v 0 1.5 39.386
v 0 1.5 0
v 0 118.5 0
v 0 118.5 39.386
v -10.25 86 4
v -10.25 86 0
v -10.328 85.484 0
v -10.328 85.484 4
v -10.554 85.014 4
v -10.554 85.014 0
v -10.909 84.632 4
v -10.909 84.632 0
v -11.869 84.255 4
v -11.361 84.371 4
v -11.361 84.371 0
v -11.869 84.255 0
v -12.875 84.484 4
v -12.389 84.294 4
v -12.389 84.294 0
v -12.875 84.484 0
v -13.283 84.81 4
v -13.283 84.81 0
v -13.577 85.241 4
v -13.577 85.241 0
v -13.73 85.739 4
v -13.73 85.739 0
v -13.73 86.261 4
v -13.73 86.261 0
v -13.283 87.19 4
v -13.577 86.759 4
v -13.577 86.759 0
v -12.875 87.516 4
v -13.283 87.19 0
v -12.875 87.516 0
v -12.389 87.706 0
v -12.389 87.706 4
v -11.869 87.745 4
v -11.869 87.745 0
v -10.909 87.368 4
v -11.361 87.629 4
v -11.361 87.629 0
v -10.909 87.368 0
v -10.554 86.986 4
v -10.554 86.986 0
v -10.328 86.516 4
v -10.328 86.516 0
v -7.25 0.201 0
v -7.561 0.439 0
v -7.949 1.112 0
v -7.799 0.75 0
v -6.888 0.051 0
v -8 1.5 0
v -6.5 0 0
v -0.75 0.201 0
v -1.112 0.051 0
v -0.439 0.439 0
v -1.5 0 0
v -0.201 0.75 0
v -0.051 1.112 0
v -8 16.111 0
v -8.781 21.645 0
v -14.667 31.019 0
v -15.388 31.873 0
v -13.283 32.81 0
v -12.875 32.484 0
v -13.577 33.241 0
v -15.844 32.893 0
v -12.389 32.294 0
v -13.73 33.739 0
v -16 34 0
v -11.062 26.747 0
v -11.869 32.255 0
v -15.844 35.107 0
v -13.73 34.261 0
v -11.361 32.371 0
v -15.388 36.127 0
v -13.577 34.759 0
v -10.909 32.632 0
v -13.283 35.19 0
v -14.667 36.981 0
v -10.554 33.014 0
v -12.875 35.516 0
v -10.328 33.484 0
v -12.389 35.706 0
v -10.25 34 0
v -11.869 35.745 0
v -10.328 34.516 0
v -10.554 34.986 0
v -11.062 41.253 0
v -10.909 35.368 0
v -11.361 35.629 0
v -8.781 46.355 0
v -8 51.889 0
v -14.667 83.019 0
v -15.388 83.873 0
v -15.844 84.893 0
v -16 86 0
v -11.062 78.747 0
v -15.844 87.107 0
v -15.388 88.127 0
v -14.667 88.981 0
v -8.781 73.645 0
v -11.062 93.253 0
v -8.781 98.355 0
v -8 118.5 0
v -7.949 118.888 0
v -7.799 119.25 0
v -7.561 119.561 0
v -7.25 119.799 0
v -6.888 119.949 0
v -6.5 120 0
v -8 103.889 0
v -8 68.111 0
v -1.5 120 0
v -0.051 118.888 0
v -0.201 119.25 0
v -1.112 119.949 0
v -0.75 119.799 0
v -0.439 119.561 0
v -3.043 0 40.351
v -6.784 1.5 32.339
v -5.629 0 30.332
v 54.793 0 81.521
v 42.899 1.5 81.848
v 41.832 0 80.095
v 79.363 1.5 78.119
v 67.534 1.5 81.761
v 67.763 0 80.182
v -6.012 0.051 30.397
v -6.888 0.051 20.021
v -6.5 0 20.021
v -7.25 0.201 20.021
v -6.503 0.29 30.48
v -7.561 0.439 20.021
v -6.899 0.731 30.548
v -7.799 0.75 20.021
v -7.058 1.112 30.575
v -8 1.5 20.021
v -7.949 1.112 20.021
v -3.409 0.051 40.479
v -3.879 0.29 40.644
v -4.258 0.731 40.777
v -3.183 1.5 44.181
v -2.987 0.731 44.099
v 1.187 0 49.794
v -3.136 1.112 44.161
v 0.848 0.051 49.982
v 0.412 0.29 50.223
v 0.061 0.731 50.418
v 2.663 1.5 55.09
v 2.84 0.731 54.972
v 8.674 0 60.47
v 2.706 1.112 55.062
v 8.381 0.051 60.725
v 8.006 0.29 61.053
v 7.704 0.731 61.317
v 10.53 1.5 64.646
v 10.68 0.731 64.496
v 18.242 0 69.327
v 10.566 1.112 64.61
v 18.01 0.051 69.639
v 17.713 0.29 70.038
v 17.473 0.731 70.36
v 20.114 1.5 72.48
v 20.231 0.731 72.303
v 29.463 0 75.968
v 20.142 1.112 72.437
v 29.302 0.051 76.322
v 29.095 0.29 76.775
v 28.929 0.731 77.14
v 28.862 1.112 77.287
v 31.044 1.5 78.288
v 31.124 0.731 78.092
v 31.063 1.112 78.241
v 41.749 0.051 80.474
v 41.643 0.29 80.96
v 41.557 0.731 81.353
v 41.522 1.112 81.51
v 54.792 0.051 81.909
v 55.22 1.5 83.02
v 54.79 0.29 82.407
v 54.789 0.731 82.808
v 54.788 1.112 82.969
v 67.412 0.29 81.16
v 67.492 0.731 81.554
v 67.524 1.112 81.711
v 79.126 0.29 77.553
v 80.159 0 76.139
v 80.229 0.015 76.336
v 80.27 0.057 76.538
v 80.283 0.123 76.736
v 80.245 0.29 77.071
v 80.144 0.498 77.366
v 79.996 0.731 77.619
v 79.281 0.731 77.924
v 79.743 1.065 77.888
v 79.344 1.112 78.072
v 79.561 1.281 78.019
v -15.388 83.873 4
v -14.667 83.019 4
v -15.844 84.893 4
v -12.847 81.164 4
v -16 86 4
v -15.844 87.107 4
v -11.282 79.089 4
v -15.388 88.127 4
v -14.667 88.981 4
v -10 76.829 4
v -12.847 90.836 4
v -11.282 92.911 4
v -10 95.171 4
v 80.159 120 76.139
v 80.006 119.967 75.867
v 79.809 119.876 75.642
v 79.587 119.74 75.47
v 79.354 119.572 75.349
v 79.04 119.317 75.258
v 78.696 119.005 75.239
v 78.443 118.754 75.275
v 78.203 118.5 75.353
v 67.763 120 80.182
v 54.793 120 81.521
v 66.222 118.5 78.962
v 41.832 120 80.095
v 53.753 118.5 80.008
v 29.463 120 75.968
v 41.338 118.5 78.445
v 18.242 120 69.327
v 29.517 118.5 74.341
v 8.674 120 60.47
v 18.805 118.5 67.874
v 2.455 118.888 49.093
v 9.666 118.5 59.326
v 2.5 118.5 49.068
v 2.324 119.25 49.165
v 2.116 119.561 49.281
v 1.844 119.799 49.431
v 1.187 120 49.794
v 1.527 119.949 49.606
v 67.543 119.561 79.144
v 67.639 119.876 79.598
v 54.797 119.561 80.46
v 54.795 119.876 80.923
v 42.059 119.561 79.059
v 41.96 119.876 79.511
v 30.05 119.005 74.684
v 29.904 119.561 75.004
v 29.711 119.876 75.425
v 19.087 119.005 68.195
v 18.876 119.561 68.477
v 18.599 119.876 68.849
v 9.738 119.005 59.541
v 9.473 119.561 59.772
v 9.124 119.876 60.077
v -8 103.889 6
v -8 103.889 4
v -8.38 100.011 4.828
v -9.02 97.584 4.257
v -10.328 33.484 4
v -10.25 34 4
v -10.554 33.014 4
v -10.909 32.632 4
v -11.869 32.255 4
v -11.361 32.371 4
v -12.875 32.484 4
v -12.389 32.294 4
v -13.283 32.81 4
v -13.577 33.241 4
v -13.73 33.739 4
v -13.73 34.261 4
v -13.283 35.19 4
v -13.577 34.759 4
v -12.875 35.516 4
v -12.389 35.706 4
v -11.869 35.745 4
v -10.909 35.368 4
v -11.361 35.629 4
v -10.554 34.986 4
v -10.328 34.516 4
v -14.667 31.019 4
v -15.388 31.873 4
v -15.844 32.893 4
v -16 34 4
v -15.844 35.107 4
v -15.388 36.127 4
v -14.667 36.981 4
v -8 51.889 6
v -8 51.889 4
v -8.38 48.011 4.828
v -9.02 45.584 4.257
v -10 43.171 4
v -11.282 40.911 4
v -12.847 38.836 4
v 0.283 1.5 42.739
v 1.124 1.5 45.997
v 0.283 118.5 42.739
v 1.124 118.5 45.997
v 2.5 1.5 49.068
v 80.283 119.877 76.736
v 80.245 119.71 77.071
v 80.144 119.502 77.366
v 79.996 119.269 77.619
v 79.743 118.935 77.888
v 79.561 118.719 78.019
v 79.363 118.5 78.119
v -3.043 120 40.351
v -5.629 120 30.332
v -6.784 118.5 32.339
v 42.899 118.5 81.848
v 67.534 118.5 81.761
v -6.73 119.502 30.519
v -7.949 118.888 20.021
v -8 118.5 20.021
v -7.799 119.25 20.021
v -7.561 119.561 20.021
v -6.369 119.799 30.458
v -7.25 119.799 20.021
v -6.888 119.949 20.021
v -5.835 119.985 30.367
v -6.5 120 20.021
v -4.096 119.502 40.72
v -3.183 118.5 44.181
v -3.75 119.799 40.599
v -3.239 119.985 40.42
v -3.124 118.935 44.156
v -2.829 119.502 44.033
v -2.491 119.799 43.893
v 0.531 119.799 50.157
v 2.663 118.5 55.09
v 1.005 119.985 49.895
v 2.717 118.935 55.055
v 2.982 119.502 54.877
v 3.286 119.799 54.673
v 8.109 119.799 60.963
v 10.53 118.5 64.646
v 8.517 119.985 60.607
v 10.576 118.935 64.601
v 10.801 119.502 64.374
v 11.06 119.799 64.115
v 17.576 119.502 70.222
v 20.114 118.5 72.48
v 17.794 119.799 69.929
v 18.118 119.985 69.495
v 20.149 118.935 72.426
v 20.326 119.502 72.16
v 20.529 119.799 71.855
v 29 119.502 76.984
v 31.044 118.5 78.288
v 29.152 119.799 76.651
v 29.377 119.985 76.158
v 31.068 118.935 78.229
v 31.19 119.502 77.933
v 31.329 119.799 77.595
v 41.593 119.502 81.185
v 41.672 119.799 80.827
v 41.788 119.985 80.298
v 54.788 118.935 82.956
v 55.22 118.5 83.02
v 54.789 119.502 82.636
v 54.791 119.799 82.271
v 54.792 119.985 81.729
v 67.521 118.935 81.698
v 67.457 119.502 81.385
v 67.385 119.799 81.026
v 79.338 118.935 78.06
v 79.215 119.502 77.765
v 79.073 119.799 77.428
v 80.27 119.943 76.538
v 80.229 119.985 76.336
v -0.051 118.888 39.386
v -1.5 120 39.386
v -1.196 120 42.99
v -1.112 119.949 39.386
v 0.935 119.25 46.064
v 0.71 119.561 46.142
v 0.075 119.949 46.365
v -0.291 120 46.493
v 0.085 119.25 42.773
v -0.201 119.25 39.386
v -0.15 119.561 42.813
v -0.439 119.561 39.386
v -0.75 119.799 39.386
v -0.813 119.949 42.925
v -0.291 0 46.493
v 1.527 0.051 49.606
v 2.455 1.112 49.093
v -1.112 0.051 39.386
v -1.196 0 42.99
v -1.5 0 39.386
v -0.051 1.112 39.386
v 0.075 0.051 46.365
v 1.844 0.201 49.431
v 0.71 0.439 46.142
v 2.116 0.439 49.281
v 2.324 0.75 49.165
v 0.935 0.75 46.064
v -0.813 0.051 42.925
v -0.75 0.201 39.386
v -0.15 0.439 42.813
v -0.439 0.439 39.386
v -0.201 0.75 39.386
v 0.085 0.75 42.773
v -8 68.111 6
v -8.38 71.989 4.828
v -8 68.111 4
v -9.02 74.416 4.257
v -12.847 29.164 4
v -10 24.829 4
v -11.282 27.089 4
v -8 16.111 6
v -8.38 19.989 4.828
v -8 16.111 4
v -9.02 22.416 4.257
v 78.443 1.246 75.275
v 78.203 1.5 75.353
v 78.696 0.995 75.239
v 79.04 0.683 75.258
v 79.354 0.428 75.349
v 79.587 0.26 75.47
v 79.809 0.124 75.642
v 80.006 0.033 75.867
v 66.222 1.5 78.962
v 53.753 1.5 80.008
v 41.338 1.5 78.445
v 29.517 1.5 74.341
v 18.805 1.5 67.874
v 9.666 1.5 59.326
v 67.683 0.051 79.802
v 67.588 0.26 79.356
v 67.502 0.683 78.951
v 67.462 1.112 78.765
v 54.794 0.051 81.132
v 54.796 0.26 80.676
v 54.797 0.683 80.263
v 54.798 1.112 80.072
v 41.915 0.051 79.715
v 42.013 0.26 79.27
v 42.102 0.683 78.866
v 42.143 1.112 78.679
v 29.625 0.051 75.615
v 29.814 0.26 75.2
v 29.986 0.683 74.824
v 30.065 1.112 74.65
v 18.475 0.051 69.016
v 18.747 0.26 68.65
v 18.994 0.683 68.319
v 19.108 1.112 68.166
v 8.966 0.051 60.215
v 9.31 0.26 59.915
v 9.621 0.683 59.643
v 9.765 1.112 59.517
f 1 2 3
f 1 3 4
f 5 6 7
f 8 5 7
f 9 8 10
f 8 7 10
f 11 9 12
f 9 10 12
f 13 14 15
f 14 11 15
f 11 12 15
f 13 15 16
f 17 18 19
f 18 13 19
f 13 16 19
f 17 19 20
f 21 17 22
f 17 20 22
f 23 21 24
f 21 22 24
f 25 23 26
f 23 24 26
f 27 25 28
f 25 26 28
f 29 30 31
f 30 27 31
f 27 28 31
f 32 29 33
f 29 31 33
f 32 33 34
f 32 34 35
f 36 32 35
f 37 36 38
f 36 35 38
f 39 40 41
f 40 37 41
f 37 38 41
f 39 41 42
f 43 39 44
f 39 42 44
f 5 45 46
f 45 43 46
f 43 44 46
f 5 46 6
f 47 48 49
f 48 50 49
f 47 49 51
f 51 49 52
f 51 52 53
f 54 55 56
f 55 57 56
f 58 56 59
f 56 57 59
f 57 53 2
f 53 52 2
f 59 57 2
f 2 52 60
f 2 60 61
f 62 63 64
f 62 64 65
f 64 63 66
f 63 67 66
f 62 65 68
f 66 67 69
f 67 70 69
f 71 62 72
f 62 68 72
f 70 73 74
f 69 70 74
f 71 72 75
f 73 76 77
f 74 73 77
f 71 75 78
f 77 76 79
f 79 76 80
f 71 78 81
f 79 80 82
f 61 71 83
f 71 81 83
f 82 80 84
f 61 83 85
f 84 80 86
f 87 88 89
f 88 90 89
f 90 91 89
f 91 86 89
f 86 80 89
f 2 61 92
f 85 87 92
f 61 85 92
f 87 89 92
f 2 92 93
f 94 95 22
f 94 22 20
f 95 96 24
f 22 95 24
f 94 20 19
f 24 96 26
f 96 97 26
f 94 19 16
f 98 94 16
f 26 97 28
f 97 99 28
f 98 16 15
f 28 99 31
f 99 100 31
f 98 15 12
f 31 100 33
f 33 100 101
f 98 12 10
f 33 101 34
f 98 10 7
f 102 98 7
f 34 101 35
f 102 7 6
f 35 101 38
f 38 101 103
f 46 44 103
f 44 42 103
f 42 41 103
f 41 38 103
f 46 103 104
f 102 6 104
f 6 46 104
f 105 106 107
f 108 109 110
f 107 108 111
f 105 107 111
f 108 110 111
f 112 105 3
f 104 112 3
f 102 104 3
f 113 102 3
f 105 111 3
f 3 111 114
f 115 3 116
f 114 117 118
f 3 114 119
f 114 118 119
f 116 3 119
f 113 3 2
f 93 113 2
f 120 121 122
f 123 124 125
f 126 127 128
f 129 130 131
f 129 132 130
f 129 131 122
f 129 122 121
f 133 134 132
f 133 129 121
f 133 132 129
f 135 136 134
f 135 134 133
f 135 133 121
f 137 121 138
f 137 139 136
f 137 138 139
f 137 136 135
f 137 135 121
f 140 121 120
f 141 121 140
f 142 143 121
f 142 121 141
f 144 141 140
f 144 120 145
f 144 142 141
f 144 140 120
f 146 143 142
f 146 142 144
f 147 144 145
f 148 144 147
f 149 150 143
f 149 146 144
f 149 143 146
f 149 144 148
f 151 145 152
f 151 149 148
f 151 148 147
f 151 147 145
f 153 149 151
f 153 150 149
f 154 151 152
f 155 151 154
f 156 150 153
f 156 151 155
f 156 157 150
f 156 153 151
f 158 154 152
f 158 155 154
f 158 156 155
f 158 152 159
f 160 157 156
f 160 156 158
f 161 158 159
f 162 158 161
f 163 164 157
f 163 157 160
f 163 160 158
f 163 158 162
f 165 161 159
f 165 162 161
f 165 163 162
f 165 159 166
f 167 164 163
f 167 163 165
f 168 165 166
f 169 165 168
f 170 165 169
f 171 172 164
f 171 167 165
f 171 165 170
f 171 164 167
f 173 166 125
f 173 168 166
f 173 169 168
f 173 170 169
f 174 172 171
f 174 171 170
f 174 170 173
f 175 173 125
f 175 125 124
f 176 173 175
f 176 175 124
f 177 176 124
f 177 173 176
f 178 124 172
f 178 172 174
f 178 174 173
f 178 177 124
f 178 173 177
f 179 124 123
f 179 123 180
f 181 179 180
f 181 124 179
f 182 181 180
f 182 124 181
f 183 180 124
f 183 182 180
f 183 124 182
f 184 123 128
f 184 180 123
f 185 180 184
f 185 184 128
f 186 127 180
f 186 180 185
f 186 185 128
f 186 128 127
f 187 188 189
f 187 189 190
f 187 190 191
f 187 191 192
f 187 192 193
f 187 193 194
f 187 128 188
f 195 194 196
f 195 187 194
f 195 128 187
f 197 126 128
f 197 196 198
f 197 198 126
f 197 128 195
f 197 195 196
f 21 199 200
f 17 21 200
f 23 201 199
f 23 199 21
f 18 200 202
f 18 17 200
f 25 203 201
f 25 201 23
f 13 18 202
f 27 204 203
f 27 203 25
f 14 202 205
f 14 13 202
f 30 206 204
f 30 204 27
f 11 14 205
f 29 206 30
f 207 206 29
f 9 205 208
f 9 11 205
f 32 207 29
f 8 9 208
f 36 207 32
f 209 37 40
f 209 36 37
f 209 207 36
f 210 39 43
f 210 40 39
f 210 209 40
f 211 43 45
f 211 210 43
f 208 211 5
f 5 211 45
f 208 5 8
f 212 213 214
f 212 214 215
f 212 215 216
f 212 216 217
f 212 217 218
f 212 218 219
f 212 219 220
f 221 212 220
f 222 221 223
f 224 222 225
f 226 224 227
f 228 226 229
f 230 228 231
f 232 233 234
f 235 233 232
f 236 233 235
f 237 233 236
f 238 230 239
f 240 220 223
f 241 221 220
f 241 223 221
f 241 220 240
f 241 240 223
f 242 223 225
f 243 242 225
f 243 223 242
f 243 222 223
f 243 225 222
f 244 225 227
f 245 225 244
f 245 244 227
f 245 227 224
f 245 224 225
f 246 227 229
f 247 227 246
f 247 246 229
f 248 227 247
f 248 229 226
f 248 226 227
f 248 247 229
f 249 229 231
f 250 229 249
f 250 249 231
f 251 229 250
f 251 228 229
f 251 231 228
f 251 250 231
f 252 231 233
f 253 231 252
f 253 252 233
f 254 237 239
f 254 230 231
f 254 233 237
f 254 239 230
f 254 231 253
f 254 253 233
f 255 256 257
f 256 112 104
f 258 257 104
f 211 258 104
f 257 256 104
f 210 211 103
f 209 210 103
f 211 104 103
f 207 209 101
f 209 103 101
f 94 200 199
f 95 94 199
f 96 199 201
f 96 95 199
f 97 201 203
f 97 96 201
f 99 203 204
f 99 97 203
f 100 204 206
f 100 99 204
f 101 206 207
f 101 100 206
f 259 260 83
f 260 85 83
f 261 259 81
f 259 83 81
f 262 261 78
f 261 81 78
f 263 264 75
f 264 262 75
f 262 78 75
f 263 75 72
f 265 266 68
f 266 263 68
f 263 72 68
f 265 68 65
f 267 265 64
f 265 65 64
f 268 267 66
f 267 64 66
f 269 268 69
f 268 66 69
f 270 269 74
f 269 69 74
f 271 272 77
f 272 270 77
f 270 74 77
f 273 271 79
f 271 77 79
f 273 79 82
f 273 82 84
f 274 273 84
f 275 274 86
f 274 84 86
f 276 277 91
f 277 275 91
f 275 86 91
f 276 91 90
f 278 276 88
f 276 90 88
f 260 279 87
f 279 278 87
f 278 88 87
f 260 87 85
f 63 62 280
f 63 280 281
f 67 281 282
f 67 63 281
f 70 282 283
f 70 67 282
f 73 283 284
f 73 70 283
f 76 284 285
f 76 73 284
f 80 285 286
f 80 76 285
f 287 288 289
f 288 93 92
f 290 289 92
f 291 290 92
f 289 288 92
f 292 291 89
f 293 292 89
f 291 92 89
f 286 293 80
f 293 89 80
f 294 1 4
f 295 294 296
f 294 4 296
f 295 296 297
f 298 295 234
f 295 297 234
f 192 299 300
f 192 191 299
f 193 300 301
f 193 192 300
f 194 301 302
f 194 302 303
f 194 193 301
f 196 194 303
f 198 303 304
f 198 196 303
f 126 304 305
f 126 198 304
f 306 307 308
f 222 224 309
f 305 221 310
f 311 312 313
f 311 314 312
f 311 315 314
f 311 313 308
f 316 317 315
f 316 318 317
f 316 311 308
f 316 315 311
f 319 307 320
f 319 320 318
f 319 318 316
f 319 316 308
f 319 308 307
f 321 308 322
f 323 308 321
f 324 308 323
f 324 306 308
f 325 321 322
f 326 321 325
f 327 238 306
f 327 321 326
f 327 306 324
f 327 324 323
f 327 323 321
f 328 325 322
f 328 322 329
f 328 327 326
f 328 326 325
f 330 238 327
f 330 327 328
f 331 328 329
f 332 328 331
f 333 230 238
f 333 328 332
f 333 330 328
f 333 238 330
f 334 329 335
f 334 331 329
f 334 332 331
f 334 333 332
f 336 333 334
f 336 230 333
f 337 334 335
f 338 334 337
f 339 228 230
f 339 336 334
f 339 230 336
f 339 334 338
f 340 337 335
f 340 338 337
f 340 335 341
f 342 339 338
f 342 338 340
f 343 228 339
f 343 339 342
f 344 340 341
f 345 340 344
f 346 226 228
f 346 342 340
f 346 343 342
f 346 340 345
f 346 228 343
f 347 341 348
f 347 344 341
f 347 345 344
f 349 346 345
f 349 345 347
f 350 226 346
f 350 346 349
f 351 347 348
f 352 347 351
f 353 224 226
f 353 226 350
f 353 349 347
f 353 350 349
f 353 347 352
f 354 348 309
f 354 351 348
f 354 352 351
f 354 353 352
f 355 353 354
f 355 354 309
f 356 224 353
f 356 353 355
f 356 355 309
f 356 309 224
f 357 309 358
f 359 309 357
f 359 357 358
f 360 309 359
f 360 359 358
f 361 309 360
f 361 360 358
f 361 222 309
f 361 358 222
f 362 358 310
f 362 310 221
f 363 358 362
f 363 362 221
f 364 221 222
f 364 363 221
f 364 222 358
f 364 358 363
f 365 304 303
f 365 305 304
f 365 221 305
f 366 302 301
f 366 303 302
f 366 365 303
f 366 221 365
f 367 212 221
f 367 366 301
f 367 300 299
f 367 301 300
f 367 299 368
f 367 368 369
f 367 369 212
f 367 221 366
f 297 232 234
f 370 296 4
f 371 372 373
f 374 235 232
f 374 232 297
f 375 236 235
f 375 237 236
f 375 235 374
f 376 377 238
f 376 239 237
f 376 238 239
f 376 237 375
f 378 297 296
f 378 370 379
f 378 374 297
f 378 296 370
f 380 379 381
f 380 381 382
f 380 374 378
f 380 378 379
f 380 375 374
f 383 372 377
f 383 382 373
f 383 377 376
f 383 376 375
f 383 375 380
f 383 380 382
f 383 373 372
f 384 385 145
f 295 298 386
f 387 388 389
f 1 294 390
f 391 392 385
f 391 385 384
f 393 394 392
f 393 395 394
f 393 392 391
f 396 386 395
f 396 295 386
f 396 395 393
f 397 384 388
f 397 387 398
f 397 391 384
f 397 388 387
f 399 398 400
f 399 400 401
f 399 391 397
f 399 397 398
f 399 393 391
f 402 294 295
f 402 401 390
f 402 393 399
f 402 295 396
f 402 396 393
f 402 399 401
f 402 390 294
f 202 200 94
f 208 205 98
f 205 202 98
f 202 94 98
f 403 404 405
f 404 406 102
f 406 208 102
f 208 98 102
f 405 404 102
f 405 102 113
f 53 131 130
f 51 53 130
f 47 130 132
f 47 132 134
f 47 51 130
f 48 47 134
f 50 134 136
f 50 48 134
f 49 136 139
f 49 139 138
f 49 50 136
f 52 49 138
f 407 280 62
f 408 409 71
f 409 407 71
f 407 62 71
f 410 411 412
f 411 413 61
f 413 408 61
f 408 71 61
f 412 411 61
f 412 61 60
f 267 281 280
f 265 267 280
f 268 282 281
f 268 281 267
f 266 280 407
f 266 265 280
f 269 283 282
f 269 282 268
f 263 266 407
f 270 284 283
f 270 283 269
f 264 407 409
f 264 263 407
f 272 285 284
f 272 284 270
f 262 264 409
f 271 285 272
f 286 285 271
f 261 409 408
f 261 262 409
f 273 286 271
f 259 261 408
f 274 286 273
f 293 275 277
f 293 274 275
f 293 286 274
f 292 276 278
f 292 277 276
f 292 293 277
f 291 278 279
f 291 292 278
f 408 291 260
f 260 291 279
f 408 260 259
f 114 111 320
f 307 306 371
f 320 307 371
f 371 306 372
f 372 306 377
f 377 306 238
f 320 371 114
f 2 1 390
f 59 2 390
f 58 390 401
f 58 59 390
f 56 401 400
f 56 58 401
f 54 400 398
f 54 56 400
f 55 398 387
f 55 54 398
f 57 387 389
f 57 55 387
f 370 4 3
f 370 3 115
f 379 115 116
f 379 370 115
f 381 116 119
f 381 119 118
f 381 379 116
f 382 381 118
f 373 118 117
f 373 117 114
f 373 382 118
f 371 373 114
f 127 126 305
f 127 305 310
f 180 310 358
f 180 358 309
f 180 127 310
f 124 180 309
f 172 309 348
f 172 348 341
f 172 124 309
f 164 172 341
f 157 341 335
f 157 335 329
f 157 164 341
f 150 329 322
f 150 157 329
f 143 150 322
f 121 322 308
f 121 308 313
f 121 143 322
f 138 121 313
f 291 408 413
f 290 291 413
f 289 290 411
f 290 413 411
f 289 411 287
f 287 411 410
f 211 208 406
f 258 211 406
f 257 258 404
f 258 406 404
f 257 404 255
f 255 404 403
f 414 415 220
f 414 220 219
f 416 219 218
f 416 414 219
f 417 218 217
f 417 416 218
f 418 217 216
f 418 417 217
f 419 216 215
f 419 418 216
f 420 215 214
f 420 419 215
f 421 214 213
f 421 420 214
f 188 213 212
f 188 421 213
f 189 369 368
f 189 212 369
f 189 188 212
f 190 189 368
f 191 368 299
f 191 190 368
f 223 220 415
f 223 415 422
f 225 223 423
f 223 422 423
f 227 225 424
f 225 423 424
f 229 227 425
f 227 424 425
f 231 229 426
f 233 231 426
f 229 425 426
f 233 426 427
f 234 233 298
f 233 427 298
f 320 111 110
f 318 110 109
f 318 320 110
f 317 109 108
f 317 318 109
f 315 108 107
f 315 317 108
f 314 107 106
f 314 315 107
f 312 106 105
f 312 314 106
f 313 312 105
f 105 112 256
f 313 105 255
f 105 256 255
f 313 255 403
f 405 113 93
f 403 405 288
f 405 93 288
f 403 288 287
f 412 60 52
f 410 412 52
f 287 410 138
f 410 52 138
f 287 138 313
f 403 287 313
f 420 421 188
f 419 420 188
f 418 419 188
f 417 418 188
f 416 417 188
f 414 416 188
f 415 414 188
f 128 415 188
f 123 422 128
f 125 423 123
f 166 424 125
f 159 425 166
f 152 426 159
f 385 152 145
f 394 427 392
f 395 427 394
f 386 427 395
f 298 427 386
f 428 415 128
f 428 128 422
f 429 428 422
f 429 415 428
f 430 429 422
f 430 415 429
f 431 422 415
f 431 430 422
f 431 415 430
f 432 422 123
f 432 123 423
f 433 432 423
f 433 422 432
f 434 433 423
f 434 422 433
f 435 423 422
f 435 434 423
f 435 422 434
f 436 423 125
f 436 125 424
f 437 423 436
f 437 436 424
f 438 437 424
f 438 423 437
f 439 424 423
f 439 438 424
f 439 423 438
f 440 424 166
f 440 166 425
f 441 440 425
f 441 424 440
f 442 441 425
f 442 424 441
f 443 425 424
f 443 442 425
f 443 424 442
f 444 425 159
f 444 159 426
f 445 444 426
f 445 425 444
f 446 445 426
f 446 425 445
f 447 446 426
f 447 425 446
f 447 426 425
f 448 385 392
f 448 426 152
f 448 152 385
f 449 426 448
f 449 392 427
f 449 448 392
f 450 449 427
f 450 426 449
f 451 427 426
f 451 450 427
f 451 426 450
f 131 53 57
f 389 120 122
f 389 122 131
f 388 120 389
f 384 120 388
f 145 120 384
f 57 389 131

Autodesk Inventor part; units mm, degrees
ref_plane "YZ Plane" through (0, 0, 0) normal (1, 0, 0) x (0, 1, 0)
ref_plane "XZ Plane" through (0, 0, 0) normal (0, 1, 0) x (-1, 0, 0)
ref_plane "XY Plane" through (0, 0, 0) normal (0, 0, 1) x (1, 0, 0)
sketch "Sketch1" plane through (0, 0, 0) normal (0, 0, 1) x (1, 0, 0)
  line L0 (-8, 0) -> (0, 0)
  line L1 (0, 0) -> (0, 120)
  line L2 (0, 120) -> (-8, 120)
  line L3 (-8, 120) -> (-8, 0)
  line L4 (0, 34) -> (-16, 34) construction
  line L5 (-8, 30) -> (-12, 30)
  line L6 (-12, 38) -> (-8, 38)
  arc A0 (-12, 38) -> (-12, 30) centre (-12, 34) ccw
  line L7 (0, 86) -> (-16, 86) construction
  line L8 (-8, 82) -> (-12, 82)
  line L9 (-12, 90) -> (-8, 90)
  arc A1 (-12, 90) -> (-12, 82) centre (-12, 86) ccw
  circle A2 centre (-12, 34) radius 1.75
  circle A3 centre (-12, 86) radius 1.75
  line L10 (0, 60) -> (-8, 60)
  point P0 (-8, 34)
  point P1 (-8, 86)
  dimension "d0" = 8
  dimension "d1" = 120
  dimension "d2" = 52
  dimension "d3" = 3.5
  dimension "d4" = 3.5
  dimension "d5" = 4
  dimension "d6" = 4
  dimension "d7" = 4
extrude "Extrusion1" add sketch "Sketch1" along normal blind 4
sketch "Sketch2" plane through (-8, 0, 0) normal (0, -1, 0) x (1, 0, 0)
  line L0 (0, 0) -> (8, 0) projected
  line L1 (8, 0) -> (8, 4) projected
  line L2 (0, 4) -> (8, 4) projected
  line L3 (0, 0) -> (0, 4) projected
  line L4 (8, 4) -> (8, 44)
  arc A0 (88.2833, 74.4337) -> (8, 44) centre (63, 20.0208) ccw
  arc A1 (88.2833, 77.7249) -> (0, 20.0208) centre (63, 20.0208) ccw
  line L5 (88.2833, 77.7249) -> (88.2833, 74.4337)
  line L6 (0, 4) -> (0, 20.0208)
  dimension "d10" = 40
  dimension "d11" = 60
  dimension "d20" = 63
  dimension "d22" = 3.2912
extrude "Extrusion2" add sketch "Sketch2" against normal up to surface (120 mm away) from surface at 0 contours L6 A1 L5 A0 L4 L2
fillet "Fillet1" radius 20 1 edges at (0, 60, 44)
fillet "Fillet2" radius 20 4 edges at (-8, 38, 2) (-8, 90, 2) (-8, 82, 2) (-8, 30, 2)
fillet "Fillet3" radius 1.5 12 edges at (-8, 120, 10.0104) (20.5315, 120, 72.7553) (0.6351, 120, 44.3858) (0, 120, 19.6929) (36.3979, 120, 77.0643) (80.2833, 60, 77.7249) (80.2833, 60, 74.4337) (-8, 0, 10.0104) (20.5315, 0, 72.7553) (0.6351, 0, 44.3858) (0, 0, 19.6929) (36.3979, 0, 77.0643)
fillet "Fillet4" radius 2 2 edges at (-8, 34, 4) (-8, 86, 4)
properties part number "tunel.viento"
